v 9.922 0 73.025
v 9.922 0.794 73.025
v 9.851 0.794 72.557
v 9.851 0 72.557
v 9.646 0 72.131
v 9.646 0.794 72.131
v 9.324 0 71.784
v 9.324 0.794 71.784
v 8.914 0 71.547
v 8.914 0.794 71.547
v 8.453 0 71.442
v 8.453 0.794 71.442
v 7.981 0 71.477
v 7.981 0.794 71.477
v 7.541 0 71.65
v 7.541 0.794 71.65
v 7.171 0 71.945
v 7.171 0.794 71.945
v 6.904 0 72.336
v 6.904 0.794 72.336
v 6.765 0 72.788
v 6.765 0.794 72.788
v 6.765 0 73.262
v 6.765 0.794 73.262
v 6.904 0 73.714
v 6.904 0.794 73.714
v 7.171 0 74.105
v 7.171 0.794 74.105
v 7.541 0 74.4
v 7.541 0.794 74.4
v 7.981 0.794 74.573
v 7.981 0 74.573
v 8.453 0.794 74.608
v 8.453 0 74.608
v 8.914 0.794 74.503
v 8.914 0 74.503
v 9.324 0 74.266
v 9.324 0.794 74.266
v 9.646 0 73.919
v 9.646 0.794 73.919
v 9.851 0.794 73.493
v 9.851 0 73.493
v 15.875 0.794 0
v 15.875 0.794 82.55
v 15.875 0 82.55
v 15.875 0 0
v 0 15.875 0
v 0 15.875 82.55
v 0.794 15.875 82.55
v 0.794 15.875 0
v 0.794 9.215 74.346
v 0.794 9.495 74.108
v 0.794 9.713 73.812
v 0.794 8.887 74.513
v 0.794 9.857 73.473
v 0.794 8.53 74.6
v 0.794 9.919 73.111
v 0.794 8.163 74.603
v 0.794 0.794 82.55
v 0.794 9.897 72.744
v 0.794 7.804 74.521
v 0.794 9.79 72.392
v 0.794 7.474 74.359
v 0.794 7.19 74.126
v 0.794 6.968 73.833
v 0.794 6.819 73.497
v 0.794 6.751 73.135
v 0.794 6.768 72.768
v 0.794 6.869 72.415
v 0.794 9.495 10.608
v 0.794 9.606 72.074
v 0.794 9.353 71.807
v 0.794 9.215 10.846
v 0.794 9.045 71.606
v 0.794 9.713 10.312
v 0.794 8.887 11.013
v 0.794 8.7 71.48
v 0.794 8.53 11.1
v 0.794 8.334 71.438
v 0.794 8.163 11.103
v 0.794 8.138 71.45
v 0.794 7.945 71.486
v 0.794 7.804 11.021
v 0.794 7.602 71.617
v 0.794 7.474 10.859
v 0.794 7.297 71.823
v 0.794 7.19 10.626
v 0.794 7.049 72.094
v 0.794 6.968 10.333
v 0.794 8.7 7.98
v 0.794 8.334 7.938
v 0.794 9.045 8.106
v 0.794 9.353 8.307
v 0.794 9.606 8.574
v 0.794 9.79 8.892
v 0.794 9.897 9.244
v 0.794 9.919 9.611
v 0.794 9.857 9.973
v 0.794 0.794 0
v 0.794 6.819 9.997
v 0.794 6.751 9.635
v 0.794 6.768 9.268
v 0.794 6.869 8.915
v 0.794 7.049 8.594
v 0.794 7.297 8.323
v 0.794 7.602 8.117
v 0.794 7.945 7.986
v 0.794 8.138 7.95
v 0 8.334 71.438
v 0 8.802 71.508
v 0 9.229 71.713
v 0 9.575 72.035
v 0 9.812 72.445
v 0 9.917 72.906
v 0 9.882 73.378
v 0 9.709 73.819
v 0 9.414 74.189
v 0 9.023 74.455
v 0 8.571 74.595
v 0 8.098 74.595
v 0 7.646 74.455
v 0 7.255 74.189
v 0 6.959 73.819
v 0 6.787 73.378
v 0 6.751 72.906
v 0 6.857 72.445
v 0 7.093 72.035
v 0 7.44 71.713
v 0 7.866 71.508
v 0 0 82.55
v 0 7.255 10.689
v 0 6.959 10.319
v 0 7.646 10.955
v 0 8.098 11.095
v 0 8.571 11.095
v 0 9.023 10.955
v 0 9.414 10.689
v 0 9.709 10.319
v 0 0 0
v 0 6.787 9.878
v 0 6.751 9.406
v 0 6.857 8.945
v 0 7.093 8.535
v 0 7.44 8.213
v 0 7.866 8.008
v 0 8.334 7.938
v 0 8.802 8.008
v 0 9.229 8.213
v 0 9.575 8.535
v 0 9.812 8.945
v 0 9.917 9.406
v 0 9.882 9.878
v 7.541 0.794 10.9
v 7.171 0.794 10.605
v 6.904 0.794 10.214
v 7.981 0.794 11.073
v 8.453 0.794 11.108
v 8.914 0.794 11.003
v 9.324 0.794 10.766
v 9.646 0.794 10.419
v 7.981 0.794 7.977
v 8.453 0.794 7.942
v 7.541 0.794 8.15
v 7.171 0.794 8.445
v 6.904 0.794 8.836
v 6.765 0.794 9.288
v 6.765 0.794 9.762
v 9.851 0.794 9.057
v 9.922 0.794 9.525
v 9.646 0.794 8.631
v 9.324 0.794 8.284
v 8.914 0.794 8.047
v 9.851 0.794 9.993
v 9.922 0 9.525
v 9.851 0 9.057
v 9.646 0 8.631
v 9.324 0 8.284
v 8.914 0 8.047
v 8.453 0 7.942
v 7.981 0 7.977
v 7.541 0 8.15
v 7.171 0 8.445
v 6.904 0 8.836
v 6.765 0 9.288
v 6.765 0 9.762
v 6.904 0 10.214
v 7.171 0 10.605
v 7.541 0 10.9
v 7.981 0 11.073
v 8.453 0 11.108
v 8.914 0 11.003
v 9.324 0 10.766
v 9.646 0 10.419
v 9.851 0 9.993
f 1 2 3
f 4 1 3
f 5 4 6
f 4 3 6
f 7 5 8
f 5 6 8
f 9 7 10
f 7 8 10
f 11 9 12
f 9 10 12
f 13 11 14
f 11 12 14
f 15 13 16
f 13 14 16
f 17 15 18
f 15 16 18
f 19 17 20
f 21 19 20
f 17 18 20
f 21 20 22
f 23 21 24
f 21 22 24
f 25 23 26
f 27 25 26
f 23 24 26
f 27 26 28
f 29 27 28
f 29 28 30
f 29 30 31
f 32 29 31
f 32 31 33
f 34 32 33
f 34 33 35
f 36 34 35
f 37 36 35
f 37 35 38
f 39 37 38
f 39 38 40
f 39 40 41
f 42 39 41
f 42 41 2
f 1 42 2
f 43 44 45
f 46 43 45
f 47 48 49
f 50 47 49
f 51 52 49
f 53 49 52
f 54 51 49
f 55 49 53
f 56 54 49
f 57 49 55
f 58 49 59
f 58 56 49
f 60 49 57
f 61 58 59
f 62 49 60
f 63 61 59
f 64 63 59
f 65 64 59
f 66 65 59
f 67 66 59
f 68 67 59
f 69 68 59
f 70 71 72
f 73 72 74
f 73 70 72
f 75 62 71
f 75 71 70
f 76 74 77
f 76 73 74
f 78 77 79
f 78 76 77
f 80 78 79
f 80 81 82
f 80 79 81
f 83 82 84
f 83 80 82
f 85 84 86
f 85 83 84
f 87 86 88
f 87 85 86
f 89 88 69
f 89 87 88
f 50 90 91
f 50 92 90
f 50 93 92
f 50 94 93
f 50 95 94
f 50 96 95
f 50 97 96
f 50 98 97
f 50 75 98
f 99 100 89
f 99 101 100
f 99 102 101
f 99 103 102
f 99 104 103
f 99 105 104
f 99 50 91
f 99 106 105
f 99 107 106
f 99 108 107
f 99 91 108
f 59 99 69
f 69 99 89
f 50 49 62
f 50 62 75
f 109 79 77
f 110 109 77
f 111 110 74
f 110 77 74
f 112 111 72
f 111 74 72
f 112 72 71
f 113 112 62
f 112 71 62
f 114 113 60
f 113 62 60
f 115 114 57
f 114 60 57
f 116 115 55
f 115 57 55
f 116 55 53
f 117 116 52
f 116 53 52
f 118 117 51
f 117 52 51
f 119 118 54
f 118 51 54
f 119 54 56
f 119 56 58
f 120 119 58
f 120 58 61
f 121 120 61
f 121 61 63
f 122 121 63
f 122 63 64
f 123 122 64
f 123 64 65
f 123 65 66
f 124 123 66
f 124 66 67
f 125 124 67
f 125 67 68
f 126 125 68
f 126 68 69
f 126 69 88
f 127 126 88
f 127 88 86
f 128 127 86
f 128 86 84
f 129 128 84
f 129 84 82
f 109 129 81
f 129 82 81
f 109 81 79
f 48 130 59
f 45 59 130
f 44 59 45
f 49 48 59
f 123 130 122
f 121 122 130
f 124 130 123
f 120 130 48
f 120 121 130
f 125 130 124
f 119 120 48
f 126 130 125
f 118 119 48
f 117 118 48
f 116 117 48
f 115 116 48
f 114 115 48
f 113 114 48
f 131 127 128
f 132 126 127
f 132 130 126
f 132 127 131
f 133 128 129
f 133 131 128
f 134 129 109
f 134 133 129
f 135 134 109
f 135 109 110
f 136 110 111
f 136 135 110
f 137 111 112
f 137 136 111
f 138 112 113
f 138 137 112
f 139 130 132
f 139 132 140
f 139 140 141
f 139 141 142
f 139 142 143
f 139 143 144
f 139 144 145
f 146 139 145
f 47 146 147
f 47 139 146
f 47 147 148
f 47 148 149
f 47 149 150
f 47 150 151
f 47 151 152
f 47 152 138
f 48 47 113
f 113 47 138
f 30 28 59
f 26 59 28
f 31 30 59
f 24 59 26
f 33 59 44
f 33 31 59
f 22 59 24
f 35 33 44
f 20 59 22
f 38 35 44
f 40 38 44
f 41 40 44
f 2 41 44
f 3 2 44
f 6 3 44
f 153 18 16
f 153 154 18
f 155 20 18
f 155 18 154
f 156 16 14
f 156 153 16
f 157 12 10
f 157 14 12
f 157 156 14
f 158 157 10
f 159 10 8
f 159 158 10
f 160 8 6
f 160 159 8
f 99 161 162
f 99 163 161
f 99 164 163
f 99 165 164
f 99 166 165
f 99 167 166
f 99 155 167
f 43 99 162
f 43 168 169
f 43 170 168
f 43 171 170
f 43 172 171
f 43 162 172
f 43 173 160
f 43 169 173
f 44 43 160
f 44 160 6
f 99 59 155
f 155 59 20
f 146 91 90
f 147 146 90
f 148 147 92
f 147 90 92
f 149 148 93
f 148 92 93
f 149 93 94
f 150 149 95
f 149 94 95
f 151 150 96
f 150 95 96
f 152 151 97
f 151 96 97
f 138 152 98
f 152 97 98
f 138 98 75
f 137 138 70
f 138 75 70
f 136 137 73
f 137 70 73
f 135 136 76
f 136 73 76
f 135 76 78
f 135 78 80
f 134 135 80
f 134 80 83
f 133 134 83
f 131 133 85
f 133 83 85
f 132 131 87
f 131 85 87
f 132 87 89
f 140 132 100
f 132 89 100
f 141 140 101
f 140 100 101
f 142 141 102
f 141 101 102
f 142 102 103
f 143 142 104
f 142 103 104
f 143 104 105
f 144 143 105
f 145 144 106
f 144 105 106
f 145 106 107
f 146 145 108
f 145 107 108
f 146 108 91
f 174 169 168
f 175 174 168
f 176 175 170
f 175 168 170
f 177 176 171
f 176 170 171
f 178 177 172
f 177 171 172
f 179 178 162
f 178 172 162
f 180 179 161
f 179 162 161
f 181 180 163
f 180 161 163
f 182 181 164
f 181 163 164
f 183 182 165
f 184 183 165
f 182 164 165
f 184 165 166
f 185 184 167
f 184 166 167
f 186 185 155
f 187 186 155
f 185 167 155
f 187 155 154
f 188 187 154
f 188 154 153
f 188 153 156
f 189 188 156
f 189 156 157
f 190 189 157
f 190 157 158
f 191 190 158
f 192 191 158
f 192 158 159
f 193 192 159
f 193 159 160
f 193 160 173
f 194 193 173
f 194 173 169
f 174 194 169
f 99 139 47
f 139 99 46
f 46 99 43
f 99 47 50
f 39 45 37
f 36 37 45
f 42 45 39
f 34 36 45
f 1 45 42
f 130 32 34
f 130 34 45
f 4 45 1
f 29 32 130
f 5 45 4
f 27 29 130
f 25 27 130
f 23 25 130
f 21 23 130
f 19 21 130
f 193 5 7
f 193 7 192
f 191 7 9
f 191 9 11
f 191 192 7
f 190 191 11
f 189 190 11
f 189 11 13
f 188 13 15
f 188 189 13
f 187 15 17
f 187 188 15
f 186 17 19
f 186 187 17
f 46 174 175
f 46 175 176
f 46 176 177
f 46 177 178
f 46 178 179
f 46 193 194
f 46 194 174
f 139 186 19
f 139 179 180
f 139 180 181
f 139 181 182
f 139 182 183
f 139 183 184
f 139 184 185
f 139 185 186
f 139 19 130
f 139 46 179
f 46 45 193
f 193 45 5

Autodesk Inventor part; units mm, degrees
ref_plane "YZ Plane" through (0, 0, 0) normal (1, 0, 0) x (0, 1, 0)
ref_plane "XZ Plane" through (0, 0, 0) normal (0, 1, 0) x (-1, 0, 0)
ref_plane "XY Plane" through (0, 0, 0) normal (0, 0, 1) x (1, 0, 0)
sketch "Sketch1" plane through (0, 0, 0) normal (0, 0, 1) x (1, 0, 0)
  line L0 (0, 0) -> (0, 15.875)
  line L1 (0, 15.875) -> (0.7937, 15.875)
  line L2 (0.7937, 15.875) -> (0.7938, 0.7937)
  line L3 (0.7938, 0.7937) -> (15.875, 0.7937)
  line L4 (15.875, 0.7937) -> (15.875, 0)
  line L5 (15.875, 0) -> (0, 0)
  dimension "d0" = 15.875
  dimension "d1" = 0.7937
extrude "Extrusion1" add sketch "Sketch1" along normal blind 82.55
sketch "Sketch2" plane through (0.7938, 0.7937, 0) normal (0, 1, 0) x (1, 0, 0)
  line L0 (0, 0) -> (15.0812, 0) projected
  line L1 (15.0812, -82.55) -> (0, -82.55) projected
  line L2 (7.5406, 0) -> (7.5406, -82.55) construction
  circle A0 centre (7.5406, -9.525) radius 1.5875
  circle A1 centre (7.5406, -73.025) radius 1.5875
  point P0 (-0.7938, 0)
  dimension "d4" = 9.525
  dimension "d5" = 3.175
  dimension "d6" = 82.55
  dimension "d9" = 63.5
sketch "Sketch3" plane through (0.7938, 0.7937, 0) normal (1, 0, 0) x (0, 0, -1)
  line L0 (0, 15.0812) -> (0, 0) projected
  line L1 (-82.55, 0) -> (-82.55, 15.0812) projected
  line L2 (-82.55, 7.5406) -> (0, 7.5406) construction
  circle A0 centre (-9.525, 7.5406) radius 1.5875
  circle A1 centre (-73.025, 7.5406) radius 1.5875
  point P0 (0, -0.7937)
  dimension "d14" = 3.175
  dimension "d15" = 9.525
  dimension "d16" = 82.55
  dimension "d19" = 63.5
extrude "Extrusion2" cut sketch "Sketch2" against normal through all
extrude "Extrusion3" cut sketch "Sketch3" against normal through all
properties part number "Hopper Bracing Back Left P12" material "Aluminum 6061"
